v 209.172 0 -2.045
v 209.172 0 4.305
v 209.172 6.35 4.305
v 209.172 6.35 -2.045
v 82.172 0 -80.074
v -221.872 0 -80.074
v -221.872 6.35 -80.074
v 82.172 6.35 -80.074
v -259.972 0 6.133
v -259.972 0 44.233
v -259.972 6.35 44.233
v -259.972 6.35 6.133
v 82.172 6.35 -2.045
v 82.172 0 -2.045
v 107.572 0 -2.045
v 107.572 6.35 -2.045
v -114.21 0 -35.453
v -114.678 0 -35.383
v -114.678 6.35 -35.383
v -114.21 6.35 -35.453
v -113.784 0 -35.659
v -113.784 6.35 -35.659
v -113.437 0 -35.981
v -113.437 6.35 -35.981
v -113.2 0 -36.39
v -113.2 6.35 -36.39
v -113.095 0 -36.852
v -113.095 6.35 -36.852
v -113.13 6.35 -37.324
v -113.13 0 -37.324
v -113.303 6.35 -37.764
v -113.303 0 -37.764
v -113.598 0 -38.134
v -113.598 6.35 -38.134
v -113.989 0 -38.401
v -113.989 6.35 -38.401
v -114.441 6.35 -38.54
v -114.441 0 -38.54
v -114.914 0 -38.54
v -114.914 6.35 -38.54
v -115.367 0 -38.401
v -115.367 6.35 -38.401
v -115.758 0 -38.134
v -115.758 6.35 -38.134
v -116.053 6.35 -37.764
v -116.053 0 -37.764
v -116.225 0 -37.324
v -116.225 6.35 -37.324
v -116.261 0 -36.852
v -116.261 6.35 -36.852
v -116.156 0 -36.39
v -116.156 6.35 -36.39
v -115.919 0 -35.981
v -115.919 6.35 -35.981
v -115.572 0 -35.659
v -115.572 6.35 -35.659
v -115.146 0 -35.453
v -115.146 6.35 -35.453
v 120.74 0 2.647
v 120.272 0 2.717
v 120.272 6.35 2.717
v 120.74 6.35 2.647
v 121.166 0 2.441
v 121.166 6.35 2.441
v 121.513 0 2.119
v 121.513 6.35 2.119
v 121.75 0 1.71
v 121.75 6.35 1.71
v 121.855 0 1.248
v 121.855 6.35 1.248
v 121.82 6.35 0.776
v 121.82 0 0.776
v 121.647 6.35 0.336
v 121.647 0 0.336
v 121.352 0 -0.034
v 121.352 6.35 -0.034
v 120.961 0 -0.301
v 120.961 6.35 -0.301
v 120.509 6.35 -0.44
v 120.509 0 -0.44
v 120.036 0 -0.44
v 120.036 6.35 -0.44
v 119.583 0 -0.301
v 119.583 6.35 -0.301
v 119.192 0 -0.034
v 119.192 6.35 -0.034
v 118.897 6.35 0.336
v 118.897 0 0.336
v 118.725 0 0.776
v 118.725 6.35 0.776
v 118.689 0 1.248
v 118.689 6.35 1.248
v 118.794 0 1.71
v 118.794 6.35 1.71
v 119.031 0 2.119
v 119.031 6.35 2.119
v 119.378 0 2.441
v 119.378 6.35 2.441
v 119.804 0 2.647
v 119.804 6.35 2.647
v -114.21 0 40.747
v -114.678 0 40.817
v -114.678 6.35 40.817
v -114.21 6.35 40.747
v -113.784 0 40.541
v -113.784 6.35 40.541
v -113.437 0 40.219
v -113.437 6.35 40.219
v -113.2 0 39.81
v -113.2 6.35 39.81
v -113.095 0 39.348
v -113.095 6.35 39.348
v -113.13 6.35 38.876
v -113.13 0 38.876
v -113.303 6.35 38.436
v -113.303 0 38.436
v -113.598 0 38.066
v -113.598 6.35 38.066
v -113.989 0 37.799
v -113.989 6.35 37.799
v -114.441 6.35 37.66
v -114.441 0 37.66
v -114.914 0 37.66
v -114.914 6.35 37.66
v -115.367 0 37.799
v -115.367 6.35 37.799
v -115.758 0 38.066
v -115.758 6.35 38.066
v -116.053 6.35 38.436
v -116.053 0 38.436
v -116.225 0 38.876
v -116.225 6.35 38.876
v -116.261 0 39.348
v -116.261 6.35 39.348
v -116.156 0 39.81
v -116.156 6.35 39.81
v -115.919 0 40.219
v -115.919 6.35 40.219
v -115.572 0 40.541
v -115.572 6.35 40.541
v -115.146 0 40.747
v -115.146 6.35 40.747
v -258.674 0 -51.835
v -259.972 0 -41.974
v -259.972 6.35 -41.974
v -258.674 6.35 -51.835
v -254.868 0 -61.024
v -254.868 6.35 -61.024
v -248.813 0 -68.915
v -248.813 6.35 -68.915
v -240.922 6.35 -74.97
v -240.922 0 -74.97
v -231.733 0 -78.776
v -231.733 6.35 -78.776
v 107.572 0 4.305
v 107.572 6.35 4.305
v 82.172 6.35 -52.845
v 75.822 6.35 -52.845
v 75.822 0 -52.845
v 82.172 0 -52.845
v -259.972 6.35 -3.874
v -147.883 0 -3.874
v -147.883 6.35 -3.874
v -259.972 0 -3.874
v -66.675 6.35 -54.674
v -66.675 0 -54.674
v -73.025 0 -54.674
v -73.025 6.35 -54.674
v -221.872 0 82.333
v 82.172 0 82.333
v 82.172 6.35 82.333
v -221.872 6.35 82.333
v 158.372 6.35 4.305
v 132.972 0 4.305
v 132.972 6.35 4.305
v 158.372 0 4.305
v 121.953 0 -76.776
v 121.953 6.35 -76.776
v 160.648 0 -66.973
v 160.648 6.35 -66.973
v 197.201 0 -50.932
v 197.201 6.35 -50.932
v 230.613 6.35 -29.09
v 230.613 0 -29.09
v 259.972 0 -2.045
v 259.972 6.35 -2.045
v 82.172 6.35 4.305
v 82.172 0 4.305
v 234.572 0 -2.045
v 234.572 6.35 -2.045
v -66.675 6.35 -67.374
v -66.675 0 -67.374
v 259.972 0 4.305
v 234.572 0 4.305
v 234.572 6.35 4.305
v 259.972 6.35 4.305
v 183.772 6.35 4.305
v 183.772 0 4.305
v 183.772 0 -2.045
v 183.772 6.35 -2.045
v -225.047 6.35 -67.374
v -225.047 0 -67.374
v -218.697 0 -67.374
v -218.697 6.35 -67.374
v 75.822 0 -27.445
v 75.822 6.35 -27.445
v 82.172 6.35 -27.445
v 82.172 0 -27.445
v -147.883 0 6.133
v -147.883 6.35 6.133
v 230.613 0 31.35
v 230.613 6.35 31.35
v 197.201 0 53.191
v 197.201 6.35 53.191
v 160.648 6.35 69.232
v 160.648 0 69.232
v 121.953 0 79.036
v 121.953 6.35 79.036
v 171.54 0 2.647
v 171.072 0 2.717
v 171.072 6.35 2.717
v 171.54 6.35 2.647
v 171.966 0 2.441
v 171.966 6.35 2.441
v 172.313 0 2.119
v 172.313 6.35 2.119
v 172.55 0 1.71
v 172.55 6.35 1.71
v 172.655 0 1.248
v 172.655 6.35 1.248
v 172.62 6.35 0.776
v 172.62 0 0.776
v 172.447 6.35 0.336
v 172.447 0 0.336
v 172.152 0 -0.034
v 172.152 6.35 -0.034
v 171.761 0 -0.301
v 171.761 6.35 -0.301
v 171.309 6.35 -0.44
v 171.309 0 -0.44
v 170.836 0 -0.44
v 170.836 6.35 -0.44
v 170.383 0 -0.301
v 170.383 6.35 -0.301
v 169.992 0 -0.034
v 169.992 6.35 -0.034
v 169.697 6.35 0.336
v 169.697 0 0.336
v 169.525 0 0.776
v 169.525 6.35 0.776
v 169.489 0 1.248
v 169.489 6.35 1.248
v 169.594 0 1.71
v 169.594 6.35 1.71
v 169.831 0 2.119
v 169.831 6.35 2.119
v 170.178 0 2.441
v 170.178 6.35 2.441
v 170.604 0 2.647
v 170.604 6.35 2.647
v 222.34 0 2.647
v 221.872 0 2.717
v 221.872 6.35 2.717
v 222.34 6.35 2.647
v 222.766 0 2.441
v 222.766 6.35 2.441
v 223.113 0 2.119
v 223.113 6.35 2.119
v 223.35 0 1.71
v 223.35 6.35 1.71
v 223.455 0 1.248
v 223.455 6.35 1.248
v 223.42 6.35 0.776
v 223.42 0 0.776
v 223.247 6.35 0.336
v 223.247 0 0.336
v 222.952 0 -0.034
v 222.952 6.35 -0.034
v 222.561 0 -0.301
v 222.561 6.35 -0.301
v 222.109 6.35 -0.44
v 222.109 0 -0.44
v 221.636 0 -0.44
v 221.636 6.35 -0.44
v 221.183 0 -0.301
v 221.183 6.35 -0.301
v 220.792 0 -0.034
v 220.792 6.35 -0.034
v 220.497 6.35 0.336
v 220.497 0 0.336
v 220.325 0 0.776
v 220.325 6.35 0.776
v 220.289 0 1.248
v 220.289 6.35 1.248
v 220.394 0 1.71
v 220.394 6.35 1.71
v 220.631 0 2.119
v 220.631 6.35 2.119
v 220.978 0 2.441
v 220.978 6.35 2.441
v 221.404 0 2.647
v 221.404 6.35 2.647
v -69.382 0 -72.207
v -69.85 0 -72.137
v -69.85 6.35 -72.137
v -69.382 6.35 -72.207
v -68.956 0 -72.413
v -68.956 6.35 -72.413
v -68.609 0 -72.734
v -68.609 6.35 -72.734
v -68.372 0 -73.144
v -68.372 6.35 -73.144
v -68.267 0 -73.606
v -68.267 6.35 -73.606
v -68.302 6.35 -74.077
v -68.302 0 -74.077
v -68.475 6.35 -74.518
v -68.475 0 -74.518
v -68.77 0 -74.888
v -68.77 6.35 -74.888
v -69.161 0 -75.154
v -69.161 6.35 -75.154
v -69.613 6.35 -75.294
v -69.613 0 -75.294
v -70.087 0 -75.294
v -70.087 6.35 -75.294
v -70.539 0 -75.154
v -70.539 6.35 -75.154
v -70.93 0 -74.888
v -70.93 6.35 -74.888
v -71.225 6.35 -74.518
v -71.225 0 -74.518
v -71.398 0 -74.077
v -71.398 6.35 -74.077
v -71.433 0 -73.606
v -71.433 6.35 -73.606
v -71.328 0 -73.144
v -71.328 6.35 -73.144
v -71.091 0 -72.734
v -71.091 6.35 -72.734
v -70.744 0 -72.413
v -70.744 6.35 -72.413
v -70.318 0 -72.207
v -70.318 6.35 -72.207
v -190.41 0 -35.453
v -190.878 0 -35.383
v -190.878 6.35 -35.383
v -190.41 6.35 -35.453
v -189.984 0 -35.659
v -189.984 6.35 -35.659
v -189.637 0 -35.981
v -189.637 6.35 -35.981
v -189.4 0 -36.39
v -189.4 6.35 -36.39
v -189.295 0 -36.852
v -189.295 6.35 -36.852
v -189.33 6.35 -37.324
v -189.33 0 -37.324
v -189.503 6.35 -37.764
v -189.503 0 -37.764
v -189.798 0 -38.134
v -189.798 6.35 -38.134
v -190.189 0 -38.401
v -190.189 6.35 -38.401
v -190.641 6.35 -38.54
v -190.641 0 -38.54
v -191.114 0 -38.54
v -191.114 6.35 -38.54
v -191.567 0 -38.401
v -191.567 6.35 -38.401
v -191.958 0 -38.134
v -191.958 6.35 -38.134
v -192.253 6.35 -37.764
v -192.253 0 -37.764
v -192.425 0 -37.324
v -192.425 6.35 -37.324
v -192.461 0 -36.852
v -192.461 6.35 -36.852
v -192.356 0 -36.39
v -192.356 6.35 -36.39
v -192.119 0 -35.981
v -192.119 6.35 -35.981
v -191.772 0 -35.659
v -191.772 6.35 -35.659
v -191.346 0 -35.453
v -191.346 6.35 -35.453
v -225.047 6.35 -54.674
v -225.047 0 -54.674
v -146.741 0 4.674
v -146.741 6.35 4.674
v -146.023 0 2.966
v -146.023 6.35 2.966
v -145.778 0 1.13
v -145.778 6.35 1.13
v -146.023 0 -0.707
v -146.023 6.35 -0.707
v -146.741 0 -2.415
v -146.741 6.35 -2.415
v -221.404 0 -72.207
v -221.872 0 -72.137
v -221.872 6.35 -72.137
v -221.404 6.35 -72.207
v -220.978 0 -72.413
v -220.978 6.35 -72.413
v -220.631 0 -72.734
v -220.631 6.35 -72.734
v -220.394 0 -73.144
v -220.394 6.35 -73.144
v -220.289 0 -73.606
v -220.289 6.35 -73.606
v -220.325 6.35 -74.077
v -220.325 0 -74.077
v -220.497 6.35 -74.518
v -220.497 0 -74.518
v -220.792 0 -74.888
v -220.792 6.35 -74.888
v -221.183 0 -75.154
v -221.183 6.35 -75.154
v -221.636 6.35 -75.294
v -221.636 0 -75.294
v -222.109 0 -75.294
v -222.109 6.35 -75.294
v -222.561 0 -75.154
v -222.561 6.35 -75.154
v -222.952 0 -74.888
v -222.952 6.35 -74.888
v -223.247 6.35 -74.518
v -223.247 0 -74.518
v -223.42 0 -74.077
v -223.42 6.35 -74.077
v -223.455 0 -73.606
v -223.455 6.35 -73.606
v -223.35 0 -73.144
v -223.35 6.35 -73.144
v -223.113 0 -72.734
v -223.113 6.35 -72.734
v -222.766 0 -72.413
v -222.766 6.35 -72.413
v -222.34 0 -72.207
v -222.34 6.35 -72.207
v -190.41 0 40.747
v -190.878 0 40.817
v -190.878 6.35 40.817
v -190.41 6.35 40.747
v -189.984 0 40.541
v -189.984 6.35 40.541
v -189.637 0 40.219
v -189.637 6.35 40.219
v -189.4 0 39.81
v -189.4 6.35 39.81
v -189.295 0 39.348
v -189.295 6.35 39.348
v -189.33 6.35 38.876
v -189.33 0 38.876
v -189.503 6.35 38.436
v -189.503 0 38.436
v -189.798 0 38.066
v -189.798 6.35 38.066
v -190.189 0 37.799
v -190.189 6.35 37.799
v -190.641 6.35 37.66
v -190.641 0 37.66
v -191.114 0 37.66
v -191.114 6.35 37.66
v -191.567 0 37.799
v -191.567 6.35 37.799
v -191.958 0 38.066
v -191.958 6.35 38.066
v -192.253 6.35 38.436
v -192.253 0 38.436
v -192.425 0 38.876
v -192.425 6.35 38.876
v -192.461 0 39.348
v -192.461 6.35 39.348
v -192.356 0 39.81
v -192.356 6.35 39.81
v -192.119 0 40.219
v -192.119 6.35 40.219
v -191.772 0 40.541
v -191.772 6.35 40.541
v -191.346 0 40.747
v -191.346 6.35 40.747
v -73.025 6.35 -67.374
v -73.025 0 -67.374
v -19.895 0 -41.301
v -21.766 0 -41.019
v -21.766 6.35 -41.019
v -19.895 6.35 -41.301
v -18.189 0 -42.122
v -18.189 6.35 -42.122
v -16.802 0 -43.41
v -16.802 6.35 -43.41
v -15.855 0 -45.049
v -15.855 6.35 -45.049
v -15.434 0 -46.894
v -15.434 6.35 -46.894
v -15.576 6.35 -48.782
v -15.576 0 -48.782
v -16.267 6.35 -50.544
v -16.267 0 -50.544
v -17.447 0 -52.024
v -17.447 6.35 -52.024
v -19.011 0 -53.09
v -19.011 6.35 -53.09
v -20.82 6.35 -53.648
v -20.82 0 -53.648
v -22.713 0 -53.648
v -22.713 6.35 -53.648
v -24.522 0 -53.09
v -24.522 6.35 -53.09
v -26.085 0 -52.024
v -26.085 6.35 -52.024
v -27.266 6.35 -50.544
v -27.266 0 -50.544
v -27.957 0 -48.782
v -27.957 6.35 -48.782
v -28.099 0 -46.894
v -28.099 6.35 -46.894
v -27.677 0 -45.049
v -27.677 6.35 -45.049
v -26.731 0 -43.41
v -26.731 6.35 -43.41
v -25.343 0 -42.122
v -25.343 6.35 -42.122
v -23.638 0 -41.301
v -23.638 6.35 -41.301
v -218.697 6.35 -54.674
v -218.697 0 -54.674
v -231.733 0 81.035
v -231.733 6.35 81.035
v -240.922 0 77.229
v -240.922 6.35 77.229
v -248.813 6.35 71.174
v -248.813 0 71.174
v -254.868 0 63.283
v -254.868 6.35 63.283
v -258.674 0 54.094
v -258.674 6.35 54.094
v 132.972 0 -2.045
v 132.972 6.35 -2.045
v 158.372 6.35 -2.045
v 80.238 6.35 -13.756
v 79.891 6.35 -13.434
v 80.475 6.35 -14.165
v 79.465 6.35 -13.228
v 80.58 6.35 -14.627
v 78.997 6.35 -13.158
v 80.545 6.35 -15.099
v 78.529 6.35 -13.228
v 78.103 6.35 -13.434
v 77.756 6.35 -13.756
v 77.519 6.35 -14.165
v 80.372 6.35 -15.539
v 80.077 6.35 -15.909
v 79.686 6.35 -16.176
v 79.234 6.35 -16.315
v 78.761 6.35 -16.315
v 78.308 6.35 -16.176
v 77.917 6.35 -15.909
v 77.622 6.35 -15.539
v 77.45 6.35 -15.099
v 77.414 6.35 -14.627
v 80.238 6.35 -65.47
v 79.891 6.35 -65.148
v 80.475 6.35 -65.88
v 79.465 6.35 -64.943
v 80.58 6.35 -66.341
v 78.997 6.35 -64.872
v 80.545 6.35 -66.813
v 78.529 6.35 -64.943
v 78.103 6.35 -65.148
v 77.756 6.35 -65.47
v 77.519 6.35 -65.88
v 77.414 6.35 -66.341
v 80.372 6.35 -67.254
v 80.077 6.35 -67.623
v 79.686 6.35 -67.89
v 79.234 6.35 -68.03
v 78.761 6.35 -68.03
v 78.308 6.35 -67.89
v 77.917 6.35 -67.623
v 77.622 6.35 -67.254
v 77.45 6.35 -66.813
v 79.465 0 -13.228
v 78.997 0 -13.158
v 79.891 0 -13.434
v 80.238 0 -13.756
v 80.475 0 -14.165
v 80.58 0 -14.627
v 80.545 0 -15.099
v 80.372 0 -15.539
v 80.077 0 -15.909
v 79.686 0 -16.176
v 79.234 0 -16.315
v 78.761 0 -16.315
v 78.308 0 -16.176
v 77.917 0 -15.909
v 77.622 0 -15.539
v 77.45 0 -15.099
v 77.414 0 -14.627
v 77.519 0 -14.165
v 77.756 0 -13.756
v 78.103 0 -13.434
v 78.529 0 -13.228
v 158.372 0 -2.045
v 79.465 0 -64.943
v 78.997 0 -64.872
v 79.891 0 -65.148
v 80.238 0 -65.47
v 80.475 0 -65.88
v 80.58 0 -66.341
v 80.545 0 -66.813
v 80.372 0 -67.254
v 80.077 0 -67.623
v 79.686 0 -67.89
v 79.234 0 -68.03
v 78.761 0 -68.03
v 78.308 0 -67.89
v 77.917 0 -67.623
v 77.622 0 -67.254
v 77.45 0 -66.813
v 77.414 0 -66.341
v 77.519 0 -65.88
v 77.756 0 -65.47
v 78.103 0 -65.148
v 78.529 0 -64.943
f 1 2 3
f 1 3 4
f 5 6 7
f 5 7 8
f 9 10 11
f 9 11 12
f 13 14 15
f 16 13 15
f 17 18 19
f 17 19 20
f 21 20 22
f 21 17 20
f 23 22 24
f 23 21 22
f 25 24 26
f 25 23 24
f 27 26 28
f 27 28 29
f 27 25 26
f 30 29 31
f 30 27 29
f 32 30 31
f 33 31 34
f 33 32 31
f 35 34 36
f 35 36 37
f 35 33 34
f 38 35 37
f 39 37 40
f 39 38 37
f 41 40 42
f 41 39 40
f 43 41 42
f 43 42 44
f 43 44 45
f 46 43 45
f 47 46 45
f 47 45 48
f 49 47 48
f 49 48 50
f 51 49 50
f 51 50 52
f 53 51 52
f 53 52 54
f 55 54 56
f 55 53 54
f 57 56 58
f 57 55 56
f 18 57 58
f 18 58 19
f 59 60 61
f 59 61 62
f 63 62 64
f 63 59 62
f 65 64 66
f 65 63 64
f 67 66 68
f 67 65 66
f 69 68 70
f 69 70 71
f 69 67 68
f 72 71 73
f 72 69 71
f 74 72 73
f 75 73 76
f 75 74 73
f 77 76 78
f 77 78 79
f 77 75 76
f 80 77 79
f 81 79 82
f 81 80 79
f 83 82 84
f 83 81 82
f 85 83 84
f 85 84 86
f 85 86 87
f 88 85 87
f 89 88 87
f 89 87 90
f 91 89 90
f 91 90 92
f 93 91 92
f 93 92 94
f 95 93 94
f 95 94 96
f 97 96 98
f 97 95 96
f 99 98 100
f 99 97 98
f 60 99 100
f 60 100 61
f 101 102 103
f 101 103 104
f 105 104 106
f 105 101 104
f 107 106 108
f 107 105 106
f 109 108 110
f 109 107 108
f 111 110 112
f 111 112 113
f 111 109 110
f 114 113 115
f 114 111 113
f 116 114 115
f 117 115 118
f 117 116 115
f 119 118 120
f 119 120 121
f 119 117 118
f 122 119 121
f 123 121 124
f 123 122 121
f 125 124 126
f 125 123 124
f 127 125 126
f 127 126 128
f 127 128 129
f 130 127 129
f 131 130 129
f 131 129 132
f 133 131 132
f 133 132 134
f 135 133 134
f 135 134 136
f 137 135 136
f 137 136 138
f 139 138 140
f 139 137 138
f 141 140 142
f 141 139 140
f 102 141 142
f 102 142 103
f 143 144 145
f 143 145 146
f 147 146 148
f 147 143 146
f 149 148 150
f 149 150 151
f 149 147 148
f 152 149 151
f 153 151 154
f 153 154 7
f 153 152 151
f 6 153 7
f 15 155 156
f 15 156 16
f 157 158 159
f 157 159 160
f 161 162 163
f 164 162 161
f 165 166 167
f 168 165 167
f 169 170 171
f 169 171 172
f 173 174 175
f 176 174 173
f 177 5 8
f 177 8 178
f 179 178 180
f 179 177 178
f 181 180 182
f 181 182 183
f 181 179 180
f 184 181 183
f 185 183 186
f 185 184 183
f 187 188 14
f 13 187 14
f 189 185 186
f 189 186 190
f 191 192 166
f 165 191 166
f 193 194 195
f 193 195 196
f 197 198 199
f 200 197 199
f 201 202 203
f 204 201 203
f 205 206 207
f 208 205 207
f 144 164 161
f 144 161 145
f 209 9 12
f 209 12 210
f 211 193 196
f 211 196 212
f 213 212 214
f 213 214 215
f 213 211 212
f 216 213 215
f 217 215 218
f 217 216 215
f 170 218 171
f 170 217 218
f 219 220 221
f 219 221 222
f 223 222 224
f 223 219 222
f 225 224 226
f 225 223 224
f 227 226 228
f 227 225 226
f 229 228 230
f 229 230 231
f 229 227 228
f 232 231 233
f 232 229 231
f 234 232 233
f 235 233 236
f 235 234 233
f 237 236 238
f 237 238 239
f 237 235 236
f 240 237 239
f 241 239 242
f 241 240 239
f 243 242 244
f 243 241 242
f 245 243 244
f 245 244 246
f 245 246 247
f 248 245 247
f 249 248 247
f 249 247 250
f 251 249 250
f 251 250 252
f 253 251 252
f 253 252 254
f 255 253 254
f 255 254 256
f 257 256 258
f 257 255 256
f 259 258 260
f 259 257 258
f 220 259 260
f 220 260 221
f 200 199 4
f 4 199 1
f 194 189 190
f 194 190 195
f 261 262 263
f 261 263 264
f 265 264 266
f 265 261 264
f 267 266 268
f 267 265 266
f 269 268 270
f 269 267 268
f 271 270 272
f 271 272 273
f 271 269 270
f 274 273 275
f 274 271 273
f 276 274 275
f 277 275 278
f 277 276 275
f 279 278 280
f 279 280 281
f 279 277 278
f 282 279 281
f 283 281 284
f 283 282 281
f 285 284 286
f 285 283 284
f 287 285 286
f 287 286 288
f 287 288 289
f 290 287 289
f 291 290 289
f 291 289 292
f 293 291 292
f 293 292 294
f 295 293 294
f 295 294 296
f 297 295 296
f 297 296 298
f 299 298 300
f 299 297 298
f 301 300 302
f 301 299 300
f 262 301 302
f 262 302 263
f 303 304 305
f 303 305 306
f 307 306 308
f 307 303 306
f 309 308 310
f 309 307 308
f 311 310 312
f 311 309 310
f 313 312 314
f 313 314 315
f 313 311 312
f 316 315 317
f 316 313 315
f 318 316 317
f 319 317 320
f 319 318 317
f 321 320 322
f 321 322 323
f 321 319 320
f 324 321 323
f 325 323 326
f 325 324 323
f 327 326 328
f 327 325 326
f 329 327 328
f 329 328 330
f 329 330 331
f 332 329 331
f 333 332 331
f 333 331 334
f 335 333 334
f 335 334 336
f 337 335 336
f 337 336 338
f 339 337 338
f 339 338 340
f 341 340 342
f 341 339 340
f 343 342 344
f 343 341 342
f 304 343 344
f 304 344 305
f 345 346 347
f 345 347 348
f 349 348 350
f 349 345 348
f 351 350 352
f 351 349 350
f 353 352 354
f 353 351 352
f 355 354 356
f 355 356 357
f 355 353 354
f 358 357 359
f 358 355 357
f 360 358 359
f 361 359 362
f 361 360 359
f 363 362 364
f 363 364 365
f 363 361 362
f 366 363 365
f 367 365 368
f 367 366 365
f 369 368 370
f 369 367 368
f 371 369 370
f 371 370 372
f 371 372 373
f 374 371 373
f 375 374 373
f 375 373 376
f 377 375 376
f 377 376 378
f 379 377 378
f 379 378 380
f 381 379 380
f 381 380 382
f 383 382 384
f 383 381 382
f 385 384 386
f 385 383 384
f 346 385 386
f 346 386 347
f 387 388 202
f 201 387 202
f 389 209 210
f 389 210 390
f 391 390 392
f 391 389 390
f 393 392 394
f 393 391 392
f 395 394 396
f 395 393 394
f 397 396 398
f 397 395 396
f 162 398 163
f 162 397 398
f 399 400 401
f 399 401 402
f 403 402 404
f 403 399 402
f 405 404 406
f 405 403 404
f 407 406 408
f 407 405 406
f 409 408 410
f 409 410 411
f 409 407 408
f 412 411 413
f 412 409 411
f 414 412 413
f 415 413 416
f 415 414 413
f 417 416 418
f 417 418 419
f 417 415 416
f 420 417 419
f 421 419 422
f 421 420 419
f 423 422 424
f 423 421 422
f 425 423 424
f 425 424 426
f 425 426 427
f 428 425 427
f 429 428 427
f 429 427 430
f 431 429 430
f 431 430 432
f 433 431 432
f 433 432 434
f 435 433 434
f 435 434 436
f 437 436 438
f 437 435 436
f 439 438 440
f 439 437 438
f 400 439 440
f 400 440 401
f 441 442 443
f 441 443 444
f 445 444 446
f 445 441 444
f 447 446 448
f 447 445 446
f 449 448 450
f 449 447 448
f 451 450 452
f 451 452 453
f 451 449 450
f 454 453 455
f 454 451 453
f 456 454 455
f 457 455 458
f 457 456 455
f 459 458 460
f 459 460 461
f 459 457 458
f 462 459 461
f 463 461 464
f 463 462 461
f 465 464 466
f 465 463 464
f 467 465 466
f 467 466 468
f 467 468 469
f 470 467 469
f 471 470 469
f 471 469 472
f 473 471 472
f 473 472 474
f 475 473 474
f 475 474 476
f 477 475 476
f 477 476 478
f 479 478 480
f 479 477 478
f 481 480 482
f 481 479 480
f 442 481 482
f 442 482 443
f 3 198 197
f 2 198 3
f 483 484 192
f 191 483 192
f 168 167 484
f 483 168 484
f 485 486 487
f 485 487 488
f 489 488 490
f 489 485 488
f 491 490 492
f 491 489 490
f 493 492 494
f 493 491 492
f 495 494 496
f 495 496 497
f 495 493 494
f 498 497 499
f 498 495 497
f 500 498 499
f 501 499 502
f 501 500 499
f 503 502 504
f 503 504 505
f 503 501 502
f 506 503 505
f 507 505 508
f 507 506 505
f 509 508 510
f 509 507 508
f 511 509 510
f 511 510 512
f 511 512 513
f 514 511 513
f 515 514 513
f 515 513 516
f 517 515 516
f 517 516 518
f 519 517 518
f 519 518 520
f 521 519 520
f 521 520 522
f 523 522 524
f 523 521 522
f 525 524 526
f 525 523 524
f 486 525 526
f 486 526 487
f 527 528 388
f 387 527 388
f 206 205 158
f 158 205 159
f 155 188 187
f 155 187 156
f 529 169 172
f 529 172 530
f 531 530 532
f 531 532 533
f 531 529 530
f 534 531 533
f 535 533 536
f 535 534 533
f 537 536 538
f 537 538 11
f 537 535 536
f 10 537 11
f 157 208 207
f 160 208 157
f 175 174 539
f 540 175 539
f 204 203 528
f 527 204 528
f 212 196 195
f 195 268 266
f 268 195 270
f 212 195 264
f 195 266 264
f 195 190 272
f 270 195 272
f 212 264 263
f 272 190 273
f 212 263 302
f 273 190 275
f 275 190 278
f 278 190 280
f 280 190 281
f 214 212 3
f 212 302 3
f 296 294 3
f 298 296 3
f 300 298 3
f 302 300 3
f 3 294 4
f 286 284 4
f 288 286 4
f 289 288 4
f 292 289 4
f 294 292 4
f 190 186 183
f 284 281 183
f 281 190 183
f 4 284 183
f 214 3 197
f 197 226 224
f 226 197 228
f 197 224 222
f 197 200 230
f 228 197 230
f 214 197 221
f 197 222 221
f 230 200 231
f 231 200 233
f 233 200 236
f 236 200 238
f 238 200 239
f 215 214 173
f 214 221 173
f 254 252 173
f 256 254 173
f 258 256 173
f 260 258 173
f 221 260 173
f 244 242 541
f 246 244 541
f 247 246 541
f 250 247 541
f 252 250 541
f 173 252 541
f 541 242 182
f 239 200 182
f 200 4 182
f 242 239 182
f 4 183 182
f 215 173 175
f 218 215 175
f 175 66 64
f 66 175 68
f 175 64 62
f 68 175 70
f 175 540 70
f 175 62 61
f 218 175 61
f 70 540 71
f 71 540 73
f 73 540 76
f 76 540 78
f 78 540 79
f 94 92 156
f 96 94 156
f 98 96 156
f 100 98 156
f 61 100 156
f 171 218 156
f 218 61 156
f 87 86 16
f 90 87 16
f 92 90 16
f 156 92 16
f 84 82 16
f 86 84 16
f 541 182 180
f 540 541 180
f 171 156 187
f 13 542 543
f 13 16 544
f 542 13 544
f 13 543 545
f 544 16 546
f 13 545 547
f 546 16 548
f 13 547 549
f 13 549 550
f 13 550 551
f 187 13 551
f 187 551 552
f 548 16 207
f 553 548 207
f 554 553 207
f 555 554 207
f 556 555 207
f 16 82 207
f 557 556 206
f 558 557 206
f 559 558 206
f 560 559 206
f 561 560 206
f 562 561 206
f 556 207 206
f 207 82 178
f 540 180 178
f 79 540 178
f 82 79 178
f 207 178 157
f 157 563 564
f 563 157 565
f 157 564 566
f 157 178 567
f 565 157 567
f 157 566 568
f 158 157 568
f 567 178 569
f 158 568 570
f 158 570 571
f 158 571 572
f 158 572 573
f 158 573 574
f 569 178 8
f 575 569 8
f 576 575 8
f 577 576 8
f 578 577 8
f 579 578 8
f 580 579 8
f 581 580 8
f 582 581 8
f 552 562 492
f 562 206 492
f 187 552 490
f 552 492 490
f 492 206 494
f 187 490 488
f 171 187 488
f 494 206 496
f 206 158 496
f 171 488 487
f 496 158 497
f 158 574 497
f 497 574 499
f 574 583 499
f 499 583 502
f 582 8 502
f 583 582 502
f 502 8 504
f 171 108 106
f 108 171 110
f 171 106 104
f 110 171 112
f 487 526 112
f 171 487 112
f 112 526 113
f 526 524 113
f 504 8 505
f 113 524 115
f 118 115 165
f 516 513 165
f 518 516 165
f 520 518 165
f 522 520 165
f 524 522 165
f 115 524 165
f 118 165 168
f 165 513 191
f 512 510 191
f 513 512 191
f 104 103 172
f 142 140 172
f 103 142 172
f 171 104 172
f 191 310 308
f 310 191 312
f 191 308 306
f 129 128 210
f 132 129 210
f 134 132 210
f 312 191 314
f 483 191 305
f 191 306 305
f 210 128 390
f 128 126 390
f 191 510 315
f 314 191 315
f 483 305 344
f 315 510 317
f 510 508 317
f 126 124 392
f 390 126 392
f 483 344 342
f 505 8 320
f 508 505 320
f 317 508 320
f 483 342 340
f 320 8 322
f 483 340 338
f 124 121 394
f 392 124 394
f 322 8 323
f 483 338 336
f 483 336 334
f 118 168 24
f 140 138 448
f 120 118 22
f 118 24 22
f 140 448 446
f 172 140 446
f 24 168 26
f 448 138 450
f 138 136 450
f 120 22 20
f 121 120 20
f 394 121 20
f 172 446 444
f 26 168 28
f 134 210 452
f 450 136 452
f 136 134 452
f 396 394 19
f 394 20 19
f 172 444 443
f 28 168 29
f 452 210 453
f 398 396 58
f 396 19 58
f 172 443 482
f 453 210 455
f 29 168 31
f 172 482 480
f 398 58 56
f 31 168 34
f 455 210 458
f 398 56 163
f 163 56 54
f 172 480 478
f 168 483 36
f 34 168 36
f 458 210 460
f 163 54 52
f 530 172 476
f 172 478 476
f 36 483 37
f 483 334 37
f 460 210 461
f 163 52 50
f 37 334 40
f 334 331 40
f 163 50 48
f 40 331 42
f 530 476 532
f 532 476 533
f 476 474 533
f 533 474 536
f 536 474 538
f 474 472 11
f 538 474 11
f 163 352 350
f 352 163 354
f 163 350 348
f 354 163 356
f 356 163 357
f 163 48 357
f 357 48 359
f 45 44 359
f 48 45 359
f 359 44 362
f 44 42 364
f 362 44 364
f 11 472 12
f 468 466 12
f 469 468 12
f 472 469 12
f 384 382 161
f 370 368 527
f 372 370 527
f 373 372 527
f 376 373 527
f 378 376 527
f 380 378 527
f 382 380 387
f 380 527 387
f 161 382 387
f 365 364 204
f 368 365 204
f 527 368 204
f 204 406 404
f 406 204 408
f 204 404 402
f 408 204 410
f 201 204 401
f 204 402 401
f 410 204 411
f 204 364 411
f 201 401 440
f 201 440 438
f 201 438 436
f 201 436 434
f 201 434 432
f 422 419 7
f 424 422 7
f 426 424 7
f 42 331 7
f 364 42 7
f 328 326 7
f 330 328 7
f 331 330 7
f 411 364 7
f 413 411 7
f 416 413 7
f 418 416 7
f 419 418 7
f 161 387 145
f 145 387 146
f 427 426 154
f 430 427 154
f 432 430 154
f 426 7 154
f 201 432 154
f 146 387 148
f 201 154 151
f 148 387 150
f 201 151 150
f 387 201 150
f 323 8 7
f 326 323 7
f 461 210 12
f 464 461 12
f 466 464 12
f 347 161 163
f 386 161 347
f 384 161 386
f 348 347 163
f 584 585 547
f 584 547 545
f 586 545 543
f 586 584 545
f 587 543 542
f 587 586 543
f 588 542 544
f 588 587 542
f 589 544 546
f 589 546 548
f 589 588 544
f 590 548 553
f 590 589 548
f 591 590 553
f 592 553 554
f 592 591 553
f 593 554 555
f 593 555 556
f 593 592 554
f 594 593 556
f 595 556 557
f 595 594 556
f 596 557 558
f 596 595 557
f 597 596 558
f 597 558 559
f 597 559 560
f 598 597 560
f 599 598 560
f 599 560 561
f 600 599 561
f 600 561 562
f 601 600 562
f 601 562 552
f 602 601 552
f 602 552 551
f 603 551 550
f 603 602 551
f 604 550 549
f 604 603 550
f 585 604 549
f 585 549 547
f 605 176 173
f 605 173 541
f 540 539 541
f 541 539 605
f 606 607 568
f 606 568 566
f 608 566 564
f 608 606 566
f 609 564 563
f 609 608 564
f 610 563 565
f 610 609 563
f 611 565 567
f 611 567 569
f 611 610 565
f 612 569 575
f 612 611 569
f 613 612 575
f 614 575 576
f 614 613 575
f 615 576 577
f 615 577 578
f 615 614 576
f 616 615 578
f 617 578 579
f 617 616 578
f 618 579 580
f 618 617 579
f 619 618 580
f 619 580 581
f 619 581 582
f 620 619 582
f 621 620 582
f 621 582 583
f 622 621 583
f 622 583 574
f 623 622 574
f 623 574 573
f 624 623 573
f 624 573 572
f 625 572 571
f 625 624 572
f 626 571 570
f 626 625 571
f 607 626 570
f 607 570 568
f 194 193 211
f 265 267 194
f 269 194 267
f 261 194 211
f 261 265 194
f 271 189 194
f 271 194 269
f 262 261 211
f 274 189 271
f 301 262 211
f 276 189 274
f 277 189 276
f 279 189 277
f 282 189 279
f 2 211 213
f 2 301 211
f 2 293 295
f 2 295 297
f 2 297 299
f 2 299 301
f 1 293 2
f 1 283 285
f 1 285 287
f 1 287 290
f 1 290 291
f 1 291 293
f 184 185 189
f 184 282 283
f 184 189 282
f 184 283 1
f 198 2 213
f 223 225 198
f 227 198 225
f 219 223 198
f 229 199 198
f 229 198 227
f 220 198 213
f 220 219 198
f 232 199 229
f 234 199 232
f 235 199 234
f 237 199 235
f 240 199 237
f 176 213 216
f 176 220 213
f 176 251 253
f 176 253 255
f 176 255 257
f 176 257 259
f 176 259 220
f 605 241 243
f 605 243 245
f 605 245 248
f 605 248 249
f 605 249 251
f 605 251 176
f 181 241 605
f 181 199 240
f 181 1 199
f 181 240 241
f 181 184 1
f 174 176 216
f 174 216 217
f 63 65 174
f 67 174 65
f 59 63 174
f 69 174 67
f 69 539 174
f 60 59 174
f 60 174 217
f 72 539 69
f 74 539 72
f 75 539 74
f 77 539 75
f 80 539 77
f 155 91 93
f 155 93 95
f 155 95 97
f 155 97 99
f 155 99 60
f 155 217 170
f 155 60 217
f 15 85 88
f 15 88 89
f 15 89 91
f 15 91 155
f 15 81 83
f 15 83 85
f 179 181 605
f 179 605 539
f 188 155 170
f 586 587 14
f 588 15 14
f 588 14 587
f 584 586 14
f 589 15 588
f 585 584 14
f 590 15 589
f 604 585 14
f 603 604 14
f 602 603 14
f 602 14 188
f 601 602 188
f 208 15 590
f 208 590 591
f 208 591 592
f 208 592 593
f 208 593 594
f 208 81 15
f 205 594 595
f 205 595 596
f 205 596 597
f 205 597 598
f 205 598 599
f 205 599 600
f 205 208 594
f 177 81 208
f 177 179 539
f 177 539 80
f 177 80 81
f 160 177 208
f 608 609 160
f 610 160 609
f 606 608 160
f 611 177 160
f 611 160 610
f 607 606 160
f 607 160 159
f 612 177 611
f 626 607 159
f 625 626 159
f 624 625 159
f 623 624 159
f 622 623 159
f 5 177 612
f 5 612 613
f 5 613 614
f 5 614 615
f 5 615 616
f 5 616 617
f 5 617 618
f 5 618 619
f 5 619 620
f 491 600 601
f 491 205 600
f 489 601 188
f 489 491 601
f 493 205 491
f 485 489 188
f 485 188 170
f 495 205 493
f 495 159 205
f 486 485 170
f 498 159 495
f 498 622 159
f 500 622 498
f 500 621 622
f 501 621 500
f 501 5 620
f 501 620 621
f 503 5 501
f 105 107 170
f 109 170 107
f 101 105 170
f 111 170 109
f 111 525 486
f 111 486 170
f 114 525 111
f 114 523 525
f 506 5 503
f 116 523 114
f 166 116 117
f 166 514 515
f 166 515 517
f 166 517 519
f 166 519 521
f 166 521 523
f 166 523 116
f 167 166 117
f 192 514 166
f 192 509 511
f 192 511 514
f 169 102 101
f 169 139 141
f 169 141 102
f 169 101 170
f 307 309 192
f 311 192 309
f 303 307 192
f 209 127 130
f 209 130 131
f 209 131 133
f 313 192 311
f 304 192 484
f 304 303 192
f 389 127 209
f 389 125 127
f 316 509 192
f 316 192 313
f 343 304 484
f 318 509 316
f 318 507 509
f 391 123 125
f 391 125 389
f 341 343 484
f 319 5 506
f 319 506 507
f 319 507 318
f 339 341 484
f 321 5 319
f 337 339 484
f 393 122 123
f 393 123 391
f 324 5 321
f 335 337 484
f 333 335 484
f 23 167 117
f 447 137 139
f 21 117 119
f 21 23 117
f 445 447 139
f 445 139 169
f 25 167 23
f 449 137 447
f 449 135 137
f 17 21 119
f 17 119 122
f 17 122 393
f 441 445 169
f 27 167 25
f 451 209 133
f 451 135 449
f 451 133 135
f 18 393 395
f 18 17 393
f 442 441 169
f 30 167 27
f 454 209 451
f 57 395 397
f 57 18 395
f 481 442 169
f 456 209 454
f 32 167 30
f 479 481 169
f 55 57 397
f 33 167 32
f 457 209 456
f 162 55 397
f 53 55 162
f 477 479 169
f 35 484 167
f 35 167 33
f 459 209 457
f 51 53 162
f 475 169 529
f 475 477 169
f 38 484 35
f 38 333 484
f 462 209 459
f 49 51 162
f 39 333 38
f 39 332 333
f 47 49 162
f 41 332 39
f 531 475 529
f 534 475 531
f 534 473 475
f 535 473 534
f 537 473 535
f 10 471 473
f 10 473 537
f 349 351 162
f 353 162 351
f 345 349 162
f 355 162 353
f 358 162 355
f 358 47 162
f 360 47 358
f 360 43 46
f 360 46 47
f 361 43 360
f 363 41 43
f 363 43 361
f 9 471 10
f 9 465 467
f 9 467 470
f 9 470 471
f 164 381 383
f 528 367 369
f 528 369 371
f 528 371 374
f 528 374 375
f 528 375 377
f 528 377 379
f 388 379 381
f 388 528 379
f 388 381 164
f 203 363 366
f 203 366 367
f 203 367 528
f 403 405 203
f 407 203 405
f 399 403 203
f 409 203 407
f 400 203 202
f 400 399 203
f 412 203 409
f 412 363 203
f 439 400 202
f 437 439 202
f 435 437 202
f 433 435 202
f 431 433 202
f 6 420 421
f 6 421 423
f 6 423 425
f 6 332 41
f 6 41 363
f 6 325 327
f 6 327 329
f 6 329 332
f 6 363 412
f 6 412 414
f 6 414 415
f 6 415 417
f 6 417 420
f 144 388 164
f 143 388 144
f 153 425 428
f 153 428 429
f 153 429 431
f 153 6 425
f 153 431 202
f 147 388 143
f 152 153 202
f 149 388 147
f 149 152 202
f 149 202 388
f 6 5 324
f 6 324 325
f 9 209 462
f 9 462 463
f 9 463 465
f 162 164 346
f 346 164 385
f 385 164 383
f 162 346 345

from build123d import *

# Parameters (mm, degrees)
SKETCH1_R           = 1.5875
SKETCH1_R_2         = 6.35
SKETCH1_W           = 25.4
SKETCH1_H           = 6.35
SKETCH1_W_2         = 6.35
SKETCH1_H_2         = 25.4
BOSS_EXTRUDE1_DEPTH = 6.35


with BuildPart() as part:
    # Sketch1 → Boss-Extrude1 (new body)
    with BuildSketch(Plane(origin=(0, 0, 0), x_dir=(1, 0, 0), z_dir=(0, 1, 0))):
        with BuildLine():
            Line((-158.372209236, 3.874169231), (-259.972209236, 3.874169231))
            Line((-259.972209236, 3.874169231), (-259.972209236, 41.974169231))
            ThreePointArc((-259.972209236, 41.974169231), (-248.8129776, 68.914937594), (-221.872209236, 80.074169231))
            Line((-221.872209236, 80.074169231), (82.172209236, 80.074169231))
            ThreePointArc((82.172209236, 80.074169231), (179.256365551, 59.708562917), (259.972209236, 2.045369231))
            Line((259.972209236, 2.045369231), (234.572209236, 2.045369231))
            Line((234.572209236, 2.045369231), (234.572209236, -4.304630769))
            Line((234.572209236, -4.304630769), (259.972209236, -4.304630769))
            ThreePointArc((259.972209236, -4.304630769), (179.256365551, -61.967824455), (82.172209236, -82.333430769))
            Line((82.172209236, -82.333430769), (-221.872209236, -82.333430769))
            ThreePointArc((-221.872209236, -82.333430769), (-248.8129776, -71.174199132), (-259.972209236, -44.233430769))
            Line((-259.972209236, -44.233430769), (-259.972209236, -6.133430769))
            Line((-259.972209236, -6.133430769), (-158.372209236, -6.133430769))
            Line((-158.372209236, -6.133430769), (-147.882694507, -6.133430769))
            ThreePointArc((-147.882694507, -6.133430769), (-145.777792064, -1.129630769), (-147.882694507, 3.874169231))
            Line((-147.882694507, 3.874169231), (-158.372209236, 3.874169231))
        make_face()
        with Locations(Location((-190.877790764, -39.229630769, 0), (0, 0, 270))):
            Circle(SKETCH1_R, mode=Mode.SUBTRACT)
        with Locations(Location((-114.677790764, -39.229630769, 0), (0, 0, 270))):
            Circle(SKETCH1_R, mode=Mode.SUBTRACT)
        with Locations(Location((-114.677790764, 36.970369231, 0), (0, 0, 270))):
            Circle(SKETCH1_R, mode=Mode.SUBTRACT)
        with Locations(Location((-190.877790764, 36.970369231, 0), (0, 0, 270))):
            Circle(SKETCH1_R, mode=Mode.SUBTRACT)
        with Locations(Location((120.272209236, -1.129630769, 0), (0, 0, 270))):
            Circle(SKETCH1_R, mode=Mode.SUBTRACT)
        with Locations(Location((171.072209236, -1.129630769, 0), (0, 0, 270))):
            Circle(SKETCH1_R, mode=Mode.SUBTRACT)
        with Locations(Location((221.872209236, -1.129630769, 0), (0, 0, 270))):
            Circle(SKETCH1_R, mode=Mode.SUBTRACT)
        with Locations(Location((78.997209236, 14.745369231, 0), (0, 0, 270))):
            Circle(SKETCH1_R, mode=Mode.SUBTRACT)
        with Locations(Location((78.997209236, 66.459769231, 0), (0, 0, 270))):
            Circle(SKETCH1_R, mode=Mode.SUBTRACT)
        with Locations(Location((-21.766377903, 47.368819725, 0), (0, 0, 270))):
            Circle(SKETCH1_R_2, mode=Mode.SUBTRACT)
        with Locations(Location((-221.872209236, 73.724169231, 0), (0, 0, 270))):
            Circle(SKETCH1_R, mode=Mode.SUBTRACT)
        with Locations(Location((-69.85, 73.724169231, 0), (0, 0, 270))):
            Circle(SKETCH1_R, mode=Mode.SUBTRACT)
        with Locations((94.872209236, -1.129630769)):
            Rectangle(SKETCH1_W, SKETCH1_H, mode=Mode.SUBTRACT)
        with Locations((145.672209236, -1.129630769)):
            Rectangle(SKETCH1_W, SKETCH1_H, mode=Mode.SUBTRACT)
        with Locations((196.472209236, -1.129630769)):
            Rectangle(SKETCH1_W, SKETCH1_H, mode=Mode.SUBTRACT)
        with Locations((78.997209236, 40.145369231)):
            Rectangle(SKETCH1_W_2, SKETCH1_H_2, mode=Mode.SUBTRACT)
        Polygon((-221.872209236, 67.374169231), (-218.697209236, 67.374169231), (-218.697209236, 54.674169231), (-225.047209236, 54.674169231), (-225.047209236, 67.374169231), align=None, mode=Mode.SUBTRACT)
        Polygon((-69.85, 67.374169231), (-66.675, 67.374169231), (-66.675, 54.674169231), (-73.025, 54.674169231), (-73.025, 67.374169231), align=None, mode=Mode.SUBTRACT)
    extrude(amount=BOSS_EXTRUDE1_DEPTH)


solid = part.part
